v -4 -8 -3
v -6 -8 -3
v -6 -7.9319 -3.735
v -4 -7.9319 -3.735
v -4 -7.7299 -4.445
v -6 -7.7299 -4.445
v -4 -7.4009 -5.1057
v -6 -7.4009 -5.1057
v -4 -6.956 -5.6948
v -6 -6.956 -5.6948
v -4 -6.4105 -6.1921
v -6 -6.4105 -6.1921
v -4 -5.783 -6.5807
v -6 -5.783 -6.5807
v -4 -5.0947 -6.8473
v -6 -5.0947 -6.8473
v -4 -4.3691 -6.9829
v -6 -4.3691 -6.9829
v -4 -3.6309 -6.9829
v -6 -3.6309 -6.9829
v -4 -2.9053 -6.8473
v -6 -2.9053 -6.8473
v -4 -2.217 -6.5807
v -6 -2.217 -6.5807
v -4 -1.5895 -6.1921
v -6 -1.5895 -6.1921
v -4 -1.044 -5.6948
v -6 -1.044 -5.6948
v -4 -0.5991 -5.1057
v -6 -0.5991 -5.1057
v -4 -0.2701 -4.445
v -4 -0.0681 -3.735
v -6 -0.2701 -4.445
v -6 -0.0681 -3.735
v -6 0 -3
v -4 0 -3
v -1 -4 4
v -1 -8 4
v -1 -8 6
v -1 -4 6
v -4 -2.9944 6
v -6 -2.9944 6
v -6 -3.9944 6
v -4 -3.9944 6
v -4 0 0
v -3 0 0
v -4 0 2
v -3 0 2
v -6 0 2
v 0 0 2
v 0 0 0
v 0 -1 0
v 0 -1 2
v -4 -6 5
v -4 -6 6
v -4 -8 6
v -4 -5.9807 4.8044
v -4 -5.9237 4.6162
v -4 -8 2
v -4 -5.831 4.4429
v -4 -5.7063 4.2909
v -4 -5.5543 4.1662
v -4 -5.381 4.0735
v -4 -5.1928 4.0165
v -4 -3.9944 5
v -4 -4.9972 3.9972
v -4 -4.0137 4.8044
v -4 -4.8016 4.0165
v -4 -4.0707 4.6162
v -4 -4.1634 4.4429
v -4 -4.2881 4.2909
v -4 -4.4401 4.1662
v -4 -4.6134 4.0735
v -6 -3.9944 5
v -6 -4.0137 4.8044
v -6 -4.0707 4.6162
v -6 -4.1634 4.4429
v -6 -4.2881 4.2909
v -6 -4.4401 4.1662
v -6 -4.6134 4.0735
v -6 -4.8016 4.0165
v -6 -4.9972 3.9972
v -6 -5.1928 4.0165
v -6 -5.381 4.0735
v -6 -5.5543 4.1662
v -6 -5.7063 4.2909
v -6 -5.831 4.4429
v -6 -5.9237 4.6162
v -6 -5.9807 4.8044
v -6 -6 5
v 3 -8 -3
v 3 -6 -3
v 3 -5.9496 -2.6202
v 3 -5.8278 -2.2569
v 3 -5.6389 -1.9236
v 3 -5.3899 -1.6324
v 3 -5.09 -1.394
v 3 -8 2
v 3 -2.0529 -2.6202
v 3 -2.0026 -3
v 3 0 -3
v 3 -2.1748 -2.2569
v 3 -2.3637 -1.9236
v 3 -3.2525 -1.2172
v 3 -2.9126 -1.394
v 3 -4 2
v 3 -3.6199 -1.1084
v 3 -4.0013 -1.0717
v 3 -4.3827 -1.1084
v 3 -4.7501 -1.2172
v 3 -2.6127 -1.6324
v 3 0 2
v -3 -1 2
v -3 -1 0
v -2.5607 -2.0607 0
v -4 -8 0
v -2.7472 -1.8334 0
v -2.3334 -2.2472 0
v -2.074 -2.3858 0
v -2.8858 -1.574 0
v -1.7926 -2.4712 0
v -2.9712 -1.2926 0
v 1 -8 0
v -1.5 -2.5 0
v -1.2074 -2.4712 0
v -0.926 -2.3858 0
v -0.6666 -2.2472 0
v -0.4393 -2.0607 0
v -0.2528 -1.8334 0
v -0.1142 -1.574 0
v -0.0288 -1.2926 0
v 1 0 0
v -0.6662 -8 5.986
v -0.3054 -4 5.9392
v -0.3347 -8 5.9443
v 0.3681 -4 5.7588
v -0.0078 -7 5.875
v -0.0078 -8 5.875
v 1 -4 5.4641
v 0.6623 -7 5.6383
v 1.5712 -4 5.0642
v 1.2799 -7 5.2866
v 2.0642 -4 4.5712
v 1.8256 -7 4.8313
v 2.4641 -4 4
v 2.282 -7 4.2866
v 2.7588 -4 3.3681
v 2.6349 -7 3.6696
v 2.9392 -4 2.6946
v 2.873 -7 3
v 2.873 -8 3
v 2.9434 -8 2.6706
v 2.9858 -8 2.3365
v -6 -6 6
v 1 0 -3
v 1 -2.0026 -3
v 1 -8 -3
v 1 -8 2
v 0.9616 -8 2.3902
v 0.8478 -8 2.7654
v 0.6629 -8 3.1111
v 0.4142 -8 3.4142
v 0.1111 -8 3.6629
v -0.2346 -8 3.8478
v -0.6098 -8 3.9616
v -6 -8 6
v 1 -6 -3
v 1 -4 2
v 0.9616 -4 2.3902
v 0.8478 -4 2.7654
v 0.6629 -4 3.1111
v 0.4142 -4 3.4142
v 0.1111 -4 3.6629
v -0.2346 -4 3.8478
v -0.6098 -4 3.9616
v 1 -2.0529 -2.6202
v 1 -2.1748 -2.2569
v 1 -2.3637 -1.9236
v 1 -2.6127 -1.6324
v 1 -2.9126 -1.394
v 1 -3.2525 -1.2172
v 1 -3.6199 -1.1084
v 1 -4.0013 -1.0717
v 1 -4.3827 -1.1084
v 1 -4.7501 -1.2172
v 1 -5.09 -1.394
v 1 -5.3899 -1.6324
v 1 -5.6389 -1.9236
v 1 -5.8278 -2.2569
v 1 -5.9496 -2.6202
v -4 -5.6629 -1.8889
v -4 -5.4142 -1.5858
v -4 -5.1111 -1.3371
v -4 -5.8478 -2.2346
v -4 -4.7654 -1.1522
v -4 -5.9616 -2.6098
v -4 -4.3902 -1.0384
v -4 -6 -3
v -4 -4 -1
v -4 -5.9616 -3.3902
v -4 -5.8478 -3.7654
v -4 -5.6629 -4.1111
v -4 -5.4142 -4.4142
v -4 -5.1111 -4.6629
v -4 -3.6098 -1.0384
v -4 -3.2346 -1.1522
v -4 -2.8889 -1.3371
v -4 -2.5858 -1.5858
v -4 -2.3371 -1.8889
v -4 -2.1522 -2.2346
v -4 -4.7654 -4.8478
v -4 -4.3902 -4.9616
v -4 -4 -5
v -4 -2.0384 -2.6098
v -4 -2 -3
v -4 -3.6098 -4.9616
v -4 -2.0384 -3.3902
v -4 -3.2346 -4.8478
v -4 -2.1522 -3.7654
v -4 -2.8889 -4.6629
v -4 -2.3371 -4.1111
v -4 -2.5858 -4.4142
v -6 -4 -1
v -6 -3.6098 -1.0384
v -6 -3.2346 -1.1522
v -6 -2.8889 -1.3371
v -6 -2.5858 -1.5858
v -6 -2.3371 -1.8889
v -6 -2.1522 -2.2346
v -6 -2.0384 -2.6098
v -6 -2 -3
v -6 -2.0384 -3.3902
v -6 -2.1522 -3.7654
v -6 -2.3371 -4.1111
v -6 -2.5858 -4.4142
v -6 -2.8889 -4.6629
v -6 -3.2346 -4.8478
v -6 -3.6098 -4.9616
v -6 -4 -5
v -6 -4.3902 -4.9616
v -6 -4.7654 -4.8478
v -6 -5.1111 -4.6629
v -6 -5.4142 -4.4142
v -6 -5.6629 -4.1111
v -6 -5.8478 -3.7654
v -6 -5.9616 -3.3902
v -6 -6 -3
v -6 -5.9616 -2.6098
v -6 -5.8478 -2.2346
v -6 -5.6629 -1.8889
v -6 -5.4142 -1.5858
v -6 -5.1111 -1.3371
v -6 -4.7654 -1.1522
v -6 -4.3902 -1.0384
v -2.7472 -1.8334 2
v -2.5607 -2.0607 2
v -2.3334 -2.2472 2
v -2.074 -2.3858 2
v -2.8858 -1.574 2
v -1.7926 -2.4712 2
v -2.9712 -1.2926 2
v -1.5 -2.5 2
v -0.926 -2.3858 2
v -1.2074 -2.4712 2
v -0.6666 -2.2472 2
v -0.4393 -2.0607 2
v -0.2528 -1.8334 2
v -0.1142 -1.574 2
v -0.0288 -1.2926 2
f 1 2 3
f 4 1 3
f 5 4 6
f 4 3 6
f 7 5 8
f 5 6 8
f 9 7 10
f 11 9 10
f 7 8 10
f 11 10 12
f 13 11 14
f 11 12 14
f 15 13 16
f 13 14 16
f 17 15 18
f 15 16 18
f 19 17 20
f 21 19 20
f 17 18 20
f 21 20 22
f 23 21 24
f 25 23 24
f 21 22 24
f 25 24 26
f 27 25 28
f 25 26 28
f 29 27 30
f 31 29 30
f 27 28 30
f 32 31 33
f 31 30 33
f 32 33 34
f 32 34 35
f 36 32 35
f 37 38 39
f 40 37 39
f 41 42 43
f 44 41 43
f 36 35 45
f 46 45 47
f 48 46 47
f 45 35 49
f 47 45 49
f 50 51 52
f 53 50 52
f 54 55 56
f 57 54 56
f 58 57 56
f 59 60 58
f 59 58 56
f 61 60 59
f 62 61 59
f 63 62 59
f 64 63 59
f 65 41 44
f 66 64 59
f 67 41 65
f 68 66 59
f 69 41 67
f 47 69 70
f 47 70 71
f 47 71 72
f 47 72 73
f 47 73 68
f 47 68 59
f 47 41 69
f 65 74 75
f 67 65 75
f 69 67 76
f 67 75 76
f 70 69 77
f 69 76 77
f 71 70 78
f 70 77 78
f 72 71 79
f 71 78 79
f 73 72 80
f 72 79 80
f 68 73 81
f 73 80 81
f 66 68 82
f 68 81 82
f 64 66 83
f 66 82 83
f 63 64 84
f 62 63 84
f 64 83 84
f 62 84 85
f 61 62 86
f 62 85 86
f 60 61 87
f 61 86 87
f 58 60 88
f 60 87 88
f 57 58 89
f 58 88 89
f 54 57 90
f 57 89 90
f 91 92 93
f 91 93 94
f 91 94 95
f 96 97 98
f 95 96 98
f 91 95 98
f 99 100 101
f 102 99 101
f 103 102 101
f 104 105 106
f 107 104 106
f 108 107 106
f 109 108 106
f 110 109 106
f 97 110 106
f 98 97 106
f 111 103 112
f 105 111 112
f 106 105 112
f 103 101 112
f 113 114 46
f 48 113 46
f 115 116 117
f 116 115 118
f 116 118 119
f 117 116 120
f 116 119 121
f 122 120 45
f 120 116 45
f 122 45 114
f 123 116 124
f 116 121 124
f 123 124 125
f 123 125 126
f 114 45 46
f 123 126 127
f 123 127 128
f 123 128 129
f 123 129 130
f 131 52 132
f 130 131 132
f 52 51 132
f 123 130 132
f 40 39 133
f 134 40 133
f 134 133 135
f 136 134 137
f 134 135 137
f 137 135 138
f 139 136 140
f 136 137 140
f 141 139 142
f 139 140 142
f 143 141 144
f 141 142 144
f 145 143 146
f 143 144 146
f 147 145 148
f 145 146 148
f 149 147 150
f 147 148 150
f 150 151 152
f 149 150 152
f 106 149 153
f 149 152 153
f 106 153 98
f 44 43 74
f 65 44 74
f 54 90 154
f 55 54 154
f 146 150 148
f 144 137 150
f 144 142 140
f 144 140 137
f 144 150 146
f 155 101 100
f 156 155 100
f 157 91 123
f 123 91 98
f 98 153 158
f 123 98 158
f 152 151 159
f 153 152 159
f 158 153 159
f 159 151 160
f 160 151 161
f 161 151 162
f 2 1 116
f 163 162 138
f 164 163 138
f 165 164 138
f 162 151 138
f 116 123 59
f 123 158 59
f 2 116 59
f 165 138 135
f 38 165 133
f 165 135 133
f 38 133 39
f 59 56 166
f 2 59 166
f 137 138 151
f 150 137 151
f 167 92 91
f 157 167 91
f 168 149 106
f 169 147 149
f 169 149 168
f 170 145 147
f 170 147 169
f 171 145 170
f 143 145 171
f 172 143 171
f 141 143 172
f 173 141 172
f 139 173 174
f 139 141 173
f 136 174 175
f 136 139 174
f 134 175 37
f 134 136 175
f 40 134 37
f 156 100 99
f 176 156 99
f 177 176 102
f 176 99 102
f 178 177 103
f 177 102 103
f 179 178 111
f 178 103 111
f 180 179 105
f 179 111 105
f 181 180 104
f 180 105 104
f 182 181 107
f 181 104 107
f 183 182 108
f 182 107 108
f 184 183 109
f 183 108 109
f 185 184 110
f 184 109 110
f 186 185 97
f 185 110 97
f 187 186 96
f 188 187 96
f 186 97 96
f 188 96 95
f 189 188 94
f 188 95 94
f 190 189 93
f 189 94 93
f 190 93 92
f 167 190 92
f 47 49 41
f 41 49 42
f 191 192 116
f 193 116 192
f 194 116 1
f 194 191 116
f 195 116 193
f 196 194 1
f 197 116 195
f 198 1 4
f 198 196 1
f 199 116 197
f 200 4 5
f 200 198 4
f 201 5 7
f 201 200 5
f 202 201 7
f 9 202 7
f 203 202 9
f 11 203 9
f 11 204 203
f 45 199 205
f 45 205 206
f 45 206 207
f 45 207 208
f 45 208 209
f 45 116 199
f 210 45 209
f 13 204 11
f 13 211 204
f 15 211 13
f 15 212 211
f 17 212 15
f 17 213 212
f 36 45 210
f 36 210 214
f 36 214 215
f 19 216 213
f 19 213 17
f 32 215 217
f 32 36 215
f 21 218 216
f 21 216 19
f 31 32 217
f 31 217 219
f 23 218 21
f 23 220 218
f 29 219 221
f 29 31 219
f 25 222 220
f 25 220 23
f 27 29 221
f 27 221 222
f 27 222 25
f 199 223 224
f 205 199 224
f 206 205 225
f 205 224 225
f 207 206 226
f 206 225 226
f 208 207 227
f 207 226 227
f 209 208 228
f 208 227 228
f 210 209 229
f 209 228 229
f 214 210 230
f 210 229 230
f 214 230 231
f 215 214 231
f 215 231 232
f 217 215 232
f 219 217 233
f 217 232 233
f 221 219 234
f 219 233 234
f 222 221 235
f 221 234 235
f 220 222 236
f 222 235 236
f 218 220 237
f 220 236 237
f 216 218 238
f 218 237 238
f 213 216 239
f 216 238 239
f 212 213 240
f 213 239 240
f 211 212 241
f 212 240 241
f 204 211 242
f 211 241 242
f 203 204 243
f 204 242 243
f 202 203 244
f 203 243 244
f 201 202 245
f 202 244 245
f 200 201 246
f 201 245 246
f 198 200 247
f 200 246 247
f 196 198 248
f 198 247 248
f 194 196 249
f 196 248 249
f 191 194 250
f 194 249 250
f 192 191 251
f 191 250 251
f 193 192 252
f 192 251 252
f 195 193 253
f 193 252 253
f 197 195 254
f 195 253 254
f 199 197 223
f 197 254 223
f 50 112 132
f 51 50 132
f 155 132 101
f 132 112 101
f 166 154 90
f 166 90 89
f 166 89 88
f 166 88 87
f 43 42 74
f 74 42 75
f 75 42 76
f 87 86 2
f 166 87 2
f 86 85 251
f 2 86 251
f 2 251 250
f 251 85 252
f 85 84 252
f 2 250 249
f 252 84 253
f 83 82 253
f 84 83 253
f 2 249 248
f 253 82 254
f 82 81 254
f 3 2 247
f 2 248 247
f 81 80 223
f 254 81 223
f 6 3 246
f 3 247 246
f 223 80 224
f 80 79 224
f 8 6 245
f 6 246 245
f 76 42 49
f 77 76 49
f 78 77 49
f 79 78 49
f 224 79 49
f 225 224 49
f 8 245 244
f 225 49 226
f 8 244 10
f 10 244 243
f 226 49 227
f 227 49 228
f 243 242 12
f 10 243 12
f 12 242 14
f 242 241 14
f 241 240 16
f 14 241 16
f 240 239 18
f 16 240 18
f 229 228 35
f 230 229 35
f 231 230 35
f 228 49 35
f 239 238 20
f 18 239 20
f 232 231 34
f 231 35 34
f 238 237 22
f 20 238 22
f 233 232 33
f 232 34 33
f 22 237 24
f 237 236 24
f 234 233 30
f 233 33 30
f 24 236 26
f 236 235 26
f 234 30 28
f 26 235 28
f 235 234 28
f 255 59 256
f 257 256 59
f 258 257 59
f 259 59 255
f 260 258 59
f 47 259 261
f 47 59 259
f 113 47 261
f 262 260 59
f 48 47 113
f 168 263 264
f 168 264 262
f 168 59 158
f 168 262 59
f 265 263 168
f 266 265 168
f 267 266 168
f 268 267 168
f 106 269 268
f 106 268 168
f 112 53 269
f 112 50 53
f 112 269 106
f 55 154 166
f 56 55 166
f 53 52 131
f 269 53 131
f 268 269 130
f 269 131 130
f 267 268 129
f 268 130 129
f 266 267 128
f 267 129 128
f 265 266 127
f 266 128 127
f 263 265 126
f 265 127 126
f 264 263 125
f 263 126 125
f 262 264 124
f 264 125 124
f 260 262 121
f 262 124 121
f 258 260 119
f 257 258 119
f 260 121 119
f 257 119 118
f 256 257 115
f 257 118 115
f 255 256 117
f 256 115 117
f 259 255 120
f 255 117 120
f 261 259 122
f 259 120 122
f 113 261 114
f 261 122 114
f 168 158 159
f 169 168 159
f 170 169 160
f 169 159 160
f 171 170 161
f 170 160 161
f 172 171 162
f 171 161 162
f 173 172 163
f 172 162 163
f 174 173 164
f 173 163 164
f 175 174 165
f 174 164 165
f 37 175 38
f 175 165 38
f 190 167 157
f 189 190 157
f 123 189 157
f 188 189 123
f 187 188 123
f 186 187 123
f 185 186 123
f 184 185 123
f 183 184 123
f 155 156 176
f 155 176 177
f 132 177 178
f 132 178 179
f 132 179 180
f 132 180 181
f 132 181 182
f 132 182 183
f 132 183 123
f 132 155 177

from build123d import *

# Parameters (mm, degrees)
BOSS_EXTRUDE1_DEPTH = 2
BOSS_EXTRUDE2_DEPTH = 2
SKETCH3_R           = 2
BOSS_EXTRUDE3_DEPTH = 2
BOSS_EXTRUDE4_DEPTH = 2
BOSS_EXTRUDE5_DEPTH = 4
CUT_EXTRUDE1_DEPTH  = 1


with BuildPart() as part:
    # Sketch1 → Boss-Extrude1 (new body)
    with BuildSketch(Plane.XY):
        with BuildLine():
            Line((-3, 0), (-6, 0))
            Line((-6, 0), (-6, -8))
            Line((-6, -8), (3, -8))
            Line((3, -8), (3, 0))
            Line((3, 0), (0, 0))
            Line((0, 0), (0, -1))
            ThreePointArc((0, -1), (-1.5, -2.5), (-3, -1))
            Line((-3, -1), (-3, 0))
        make_face()
    extrude(amount=BOSS_EXTRUDE1_DEPTH)

    # Sketch2 → Boss-Extrude2 (add)
    with BuildSketch(Plane(origin=(3, 0, 0), x_dir=(0, 0, -1), z_dir=(1, 0, 0))):
        with BuildLine():
            Line((0, 0), (3, 0))
            Line((3, 0), (3, -2.002573702))
            ThreePointArc((3, -2.002573702), (1.071733869, -4.001286851), (3, -6))
            Line((3, -6), (3, -8))
            Line((3, -8), (0, -8))
            Line((0, -8), (0, 0))
        make_face()
    extrude(amount=-BOSS_EXTRUDE2_DEPTH)

    # Sketch3 → Boss-Extrude3 (add)
    with BuildSketch(Plane.ZY.offset(6)):
        with BuildLine():
            Line((-3, 0), (0, 0))
            Line((0, 0), (0, -8))
            Line((0, -8), (-3, -8))
            ThreePointArc((-3, -8), (-7, -4), (-3, 0))
        make_face()
        with Locations((-3, -4)):
            Circle(SKETCH3_R, mode=Mode.SUBTRACT)
    extrude(amount=-BOSS_EXTRUDE3_DEPTH)

    # Sketch4 → Boss-Extrude4 (add)
    with BuildSketch(Plane.ZY.offset(6)):
        with BuildLine():
            Line((6, -8), (2, -8))
            Line((2, -8), (2, 0))
            Line((2, 0), (6, -2.994386604))
            Line((6, -2.994386604), (6, -3.994386604))
            Line((6, -3.994386604), (5, -3.994386604))
            ThreePointArc((5, -3.994386604), (3.997193302, -4.997193302), (5, -6))
            Line((5, -6), (6, -6))
            Line((6, -6), (6, -8))
        make_face()
    extrude(amount=-BOSS_EXTRUDE4_DEPTH)

    # Sketch5 → Boss-Extrude5 (add)
    with BuildSketch(Plane.XZ.offset(8)):
        with BuildLine():
            Line((3, 2), (1, 2))
            ThreePointArc((1, 2), (0.414213562, 3.414213562), (-1, 4))
            Line((-1, 4), (-1, 6))
            ThreePointArc((-1, 6), (1.828427125, 4.828427125), (3, 2))
        make_face()
    extrude(amount=-BOSS_EXTRUDE5_DEPTH)

    # Sketch6 → Cut-Extrude1 (cut)
    with BuildSketch(Plane.XZ.offset(8)):
        with BuildLine():
            Line((-0.007843258, 5.875), (2.872983346, 3))
            ThreePointArc((2.872983346, 3), (1.825562469, 4.831288882), (-0.007843258, 5.875))
        make_face()
    extrude(amount=-CUT_EXTRUDE1_DEPTH, mode=Mode.SUBTRACT)


solid = part.part
